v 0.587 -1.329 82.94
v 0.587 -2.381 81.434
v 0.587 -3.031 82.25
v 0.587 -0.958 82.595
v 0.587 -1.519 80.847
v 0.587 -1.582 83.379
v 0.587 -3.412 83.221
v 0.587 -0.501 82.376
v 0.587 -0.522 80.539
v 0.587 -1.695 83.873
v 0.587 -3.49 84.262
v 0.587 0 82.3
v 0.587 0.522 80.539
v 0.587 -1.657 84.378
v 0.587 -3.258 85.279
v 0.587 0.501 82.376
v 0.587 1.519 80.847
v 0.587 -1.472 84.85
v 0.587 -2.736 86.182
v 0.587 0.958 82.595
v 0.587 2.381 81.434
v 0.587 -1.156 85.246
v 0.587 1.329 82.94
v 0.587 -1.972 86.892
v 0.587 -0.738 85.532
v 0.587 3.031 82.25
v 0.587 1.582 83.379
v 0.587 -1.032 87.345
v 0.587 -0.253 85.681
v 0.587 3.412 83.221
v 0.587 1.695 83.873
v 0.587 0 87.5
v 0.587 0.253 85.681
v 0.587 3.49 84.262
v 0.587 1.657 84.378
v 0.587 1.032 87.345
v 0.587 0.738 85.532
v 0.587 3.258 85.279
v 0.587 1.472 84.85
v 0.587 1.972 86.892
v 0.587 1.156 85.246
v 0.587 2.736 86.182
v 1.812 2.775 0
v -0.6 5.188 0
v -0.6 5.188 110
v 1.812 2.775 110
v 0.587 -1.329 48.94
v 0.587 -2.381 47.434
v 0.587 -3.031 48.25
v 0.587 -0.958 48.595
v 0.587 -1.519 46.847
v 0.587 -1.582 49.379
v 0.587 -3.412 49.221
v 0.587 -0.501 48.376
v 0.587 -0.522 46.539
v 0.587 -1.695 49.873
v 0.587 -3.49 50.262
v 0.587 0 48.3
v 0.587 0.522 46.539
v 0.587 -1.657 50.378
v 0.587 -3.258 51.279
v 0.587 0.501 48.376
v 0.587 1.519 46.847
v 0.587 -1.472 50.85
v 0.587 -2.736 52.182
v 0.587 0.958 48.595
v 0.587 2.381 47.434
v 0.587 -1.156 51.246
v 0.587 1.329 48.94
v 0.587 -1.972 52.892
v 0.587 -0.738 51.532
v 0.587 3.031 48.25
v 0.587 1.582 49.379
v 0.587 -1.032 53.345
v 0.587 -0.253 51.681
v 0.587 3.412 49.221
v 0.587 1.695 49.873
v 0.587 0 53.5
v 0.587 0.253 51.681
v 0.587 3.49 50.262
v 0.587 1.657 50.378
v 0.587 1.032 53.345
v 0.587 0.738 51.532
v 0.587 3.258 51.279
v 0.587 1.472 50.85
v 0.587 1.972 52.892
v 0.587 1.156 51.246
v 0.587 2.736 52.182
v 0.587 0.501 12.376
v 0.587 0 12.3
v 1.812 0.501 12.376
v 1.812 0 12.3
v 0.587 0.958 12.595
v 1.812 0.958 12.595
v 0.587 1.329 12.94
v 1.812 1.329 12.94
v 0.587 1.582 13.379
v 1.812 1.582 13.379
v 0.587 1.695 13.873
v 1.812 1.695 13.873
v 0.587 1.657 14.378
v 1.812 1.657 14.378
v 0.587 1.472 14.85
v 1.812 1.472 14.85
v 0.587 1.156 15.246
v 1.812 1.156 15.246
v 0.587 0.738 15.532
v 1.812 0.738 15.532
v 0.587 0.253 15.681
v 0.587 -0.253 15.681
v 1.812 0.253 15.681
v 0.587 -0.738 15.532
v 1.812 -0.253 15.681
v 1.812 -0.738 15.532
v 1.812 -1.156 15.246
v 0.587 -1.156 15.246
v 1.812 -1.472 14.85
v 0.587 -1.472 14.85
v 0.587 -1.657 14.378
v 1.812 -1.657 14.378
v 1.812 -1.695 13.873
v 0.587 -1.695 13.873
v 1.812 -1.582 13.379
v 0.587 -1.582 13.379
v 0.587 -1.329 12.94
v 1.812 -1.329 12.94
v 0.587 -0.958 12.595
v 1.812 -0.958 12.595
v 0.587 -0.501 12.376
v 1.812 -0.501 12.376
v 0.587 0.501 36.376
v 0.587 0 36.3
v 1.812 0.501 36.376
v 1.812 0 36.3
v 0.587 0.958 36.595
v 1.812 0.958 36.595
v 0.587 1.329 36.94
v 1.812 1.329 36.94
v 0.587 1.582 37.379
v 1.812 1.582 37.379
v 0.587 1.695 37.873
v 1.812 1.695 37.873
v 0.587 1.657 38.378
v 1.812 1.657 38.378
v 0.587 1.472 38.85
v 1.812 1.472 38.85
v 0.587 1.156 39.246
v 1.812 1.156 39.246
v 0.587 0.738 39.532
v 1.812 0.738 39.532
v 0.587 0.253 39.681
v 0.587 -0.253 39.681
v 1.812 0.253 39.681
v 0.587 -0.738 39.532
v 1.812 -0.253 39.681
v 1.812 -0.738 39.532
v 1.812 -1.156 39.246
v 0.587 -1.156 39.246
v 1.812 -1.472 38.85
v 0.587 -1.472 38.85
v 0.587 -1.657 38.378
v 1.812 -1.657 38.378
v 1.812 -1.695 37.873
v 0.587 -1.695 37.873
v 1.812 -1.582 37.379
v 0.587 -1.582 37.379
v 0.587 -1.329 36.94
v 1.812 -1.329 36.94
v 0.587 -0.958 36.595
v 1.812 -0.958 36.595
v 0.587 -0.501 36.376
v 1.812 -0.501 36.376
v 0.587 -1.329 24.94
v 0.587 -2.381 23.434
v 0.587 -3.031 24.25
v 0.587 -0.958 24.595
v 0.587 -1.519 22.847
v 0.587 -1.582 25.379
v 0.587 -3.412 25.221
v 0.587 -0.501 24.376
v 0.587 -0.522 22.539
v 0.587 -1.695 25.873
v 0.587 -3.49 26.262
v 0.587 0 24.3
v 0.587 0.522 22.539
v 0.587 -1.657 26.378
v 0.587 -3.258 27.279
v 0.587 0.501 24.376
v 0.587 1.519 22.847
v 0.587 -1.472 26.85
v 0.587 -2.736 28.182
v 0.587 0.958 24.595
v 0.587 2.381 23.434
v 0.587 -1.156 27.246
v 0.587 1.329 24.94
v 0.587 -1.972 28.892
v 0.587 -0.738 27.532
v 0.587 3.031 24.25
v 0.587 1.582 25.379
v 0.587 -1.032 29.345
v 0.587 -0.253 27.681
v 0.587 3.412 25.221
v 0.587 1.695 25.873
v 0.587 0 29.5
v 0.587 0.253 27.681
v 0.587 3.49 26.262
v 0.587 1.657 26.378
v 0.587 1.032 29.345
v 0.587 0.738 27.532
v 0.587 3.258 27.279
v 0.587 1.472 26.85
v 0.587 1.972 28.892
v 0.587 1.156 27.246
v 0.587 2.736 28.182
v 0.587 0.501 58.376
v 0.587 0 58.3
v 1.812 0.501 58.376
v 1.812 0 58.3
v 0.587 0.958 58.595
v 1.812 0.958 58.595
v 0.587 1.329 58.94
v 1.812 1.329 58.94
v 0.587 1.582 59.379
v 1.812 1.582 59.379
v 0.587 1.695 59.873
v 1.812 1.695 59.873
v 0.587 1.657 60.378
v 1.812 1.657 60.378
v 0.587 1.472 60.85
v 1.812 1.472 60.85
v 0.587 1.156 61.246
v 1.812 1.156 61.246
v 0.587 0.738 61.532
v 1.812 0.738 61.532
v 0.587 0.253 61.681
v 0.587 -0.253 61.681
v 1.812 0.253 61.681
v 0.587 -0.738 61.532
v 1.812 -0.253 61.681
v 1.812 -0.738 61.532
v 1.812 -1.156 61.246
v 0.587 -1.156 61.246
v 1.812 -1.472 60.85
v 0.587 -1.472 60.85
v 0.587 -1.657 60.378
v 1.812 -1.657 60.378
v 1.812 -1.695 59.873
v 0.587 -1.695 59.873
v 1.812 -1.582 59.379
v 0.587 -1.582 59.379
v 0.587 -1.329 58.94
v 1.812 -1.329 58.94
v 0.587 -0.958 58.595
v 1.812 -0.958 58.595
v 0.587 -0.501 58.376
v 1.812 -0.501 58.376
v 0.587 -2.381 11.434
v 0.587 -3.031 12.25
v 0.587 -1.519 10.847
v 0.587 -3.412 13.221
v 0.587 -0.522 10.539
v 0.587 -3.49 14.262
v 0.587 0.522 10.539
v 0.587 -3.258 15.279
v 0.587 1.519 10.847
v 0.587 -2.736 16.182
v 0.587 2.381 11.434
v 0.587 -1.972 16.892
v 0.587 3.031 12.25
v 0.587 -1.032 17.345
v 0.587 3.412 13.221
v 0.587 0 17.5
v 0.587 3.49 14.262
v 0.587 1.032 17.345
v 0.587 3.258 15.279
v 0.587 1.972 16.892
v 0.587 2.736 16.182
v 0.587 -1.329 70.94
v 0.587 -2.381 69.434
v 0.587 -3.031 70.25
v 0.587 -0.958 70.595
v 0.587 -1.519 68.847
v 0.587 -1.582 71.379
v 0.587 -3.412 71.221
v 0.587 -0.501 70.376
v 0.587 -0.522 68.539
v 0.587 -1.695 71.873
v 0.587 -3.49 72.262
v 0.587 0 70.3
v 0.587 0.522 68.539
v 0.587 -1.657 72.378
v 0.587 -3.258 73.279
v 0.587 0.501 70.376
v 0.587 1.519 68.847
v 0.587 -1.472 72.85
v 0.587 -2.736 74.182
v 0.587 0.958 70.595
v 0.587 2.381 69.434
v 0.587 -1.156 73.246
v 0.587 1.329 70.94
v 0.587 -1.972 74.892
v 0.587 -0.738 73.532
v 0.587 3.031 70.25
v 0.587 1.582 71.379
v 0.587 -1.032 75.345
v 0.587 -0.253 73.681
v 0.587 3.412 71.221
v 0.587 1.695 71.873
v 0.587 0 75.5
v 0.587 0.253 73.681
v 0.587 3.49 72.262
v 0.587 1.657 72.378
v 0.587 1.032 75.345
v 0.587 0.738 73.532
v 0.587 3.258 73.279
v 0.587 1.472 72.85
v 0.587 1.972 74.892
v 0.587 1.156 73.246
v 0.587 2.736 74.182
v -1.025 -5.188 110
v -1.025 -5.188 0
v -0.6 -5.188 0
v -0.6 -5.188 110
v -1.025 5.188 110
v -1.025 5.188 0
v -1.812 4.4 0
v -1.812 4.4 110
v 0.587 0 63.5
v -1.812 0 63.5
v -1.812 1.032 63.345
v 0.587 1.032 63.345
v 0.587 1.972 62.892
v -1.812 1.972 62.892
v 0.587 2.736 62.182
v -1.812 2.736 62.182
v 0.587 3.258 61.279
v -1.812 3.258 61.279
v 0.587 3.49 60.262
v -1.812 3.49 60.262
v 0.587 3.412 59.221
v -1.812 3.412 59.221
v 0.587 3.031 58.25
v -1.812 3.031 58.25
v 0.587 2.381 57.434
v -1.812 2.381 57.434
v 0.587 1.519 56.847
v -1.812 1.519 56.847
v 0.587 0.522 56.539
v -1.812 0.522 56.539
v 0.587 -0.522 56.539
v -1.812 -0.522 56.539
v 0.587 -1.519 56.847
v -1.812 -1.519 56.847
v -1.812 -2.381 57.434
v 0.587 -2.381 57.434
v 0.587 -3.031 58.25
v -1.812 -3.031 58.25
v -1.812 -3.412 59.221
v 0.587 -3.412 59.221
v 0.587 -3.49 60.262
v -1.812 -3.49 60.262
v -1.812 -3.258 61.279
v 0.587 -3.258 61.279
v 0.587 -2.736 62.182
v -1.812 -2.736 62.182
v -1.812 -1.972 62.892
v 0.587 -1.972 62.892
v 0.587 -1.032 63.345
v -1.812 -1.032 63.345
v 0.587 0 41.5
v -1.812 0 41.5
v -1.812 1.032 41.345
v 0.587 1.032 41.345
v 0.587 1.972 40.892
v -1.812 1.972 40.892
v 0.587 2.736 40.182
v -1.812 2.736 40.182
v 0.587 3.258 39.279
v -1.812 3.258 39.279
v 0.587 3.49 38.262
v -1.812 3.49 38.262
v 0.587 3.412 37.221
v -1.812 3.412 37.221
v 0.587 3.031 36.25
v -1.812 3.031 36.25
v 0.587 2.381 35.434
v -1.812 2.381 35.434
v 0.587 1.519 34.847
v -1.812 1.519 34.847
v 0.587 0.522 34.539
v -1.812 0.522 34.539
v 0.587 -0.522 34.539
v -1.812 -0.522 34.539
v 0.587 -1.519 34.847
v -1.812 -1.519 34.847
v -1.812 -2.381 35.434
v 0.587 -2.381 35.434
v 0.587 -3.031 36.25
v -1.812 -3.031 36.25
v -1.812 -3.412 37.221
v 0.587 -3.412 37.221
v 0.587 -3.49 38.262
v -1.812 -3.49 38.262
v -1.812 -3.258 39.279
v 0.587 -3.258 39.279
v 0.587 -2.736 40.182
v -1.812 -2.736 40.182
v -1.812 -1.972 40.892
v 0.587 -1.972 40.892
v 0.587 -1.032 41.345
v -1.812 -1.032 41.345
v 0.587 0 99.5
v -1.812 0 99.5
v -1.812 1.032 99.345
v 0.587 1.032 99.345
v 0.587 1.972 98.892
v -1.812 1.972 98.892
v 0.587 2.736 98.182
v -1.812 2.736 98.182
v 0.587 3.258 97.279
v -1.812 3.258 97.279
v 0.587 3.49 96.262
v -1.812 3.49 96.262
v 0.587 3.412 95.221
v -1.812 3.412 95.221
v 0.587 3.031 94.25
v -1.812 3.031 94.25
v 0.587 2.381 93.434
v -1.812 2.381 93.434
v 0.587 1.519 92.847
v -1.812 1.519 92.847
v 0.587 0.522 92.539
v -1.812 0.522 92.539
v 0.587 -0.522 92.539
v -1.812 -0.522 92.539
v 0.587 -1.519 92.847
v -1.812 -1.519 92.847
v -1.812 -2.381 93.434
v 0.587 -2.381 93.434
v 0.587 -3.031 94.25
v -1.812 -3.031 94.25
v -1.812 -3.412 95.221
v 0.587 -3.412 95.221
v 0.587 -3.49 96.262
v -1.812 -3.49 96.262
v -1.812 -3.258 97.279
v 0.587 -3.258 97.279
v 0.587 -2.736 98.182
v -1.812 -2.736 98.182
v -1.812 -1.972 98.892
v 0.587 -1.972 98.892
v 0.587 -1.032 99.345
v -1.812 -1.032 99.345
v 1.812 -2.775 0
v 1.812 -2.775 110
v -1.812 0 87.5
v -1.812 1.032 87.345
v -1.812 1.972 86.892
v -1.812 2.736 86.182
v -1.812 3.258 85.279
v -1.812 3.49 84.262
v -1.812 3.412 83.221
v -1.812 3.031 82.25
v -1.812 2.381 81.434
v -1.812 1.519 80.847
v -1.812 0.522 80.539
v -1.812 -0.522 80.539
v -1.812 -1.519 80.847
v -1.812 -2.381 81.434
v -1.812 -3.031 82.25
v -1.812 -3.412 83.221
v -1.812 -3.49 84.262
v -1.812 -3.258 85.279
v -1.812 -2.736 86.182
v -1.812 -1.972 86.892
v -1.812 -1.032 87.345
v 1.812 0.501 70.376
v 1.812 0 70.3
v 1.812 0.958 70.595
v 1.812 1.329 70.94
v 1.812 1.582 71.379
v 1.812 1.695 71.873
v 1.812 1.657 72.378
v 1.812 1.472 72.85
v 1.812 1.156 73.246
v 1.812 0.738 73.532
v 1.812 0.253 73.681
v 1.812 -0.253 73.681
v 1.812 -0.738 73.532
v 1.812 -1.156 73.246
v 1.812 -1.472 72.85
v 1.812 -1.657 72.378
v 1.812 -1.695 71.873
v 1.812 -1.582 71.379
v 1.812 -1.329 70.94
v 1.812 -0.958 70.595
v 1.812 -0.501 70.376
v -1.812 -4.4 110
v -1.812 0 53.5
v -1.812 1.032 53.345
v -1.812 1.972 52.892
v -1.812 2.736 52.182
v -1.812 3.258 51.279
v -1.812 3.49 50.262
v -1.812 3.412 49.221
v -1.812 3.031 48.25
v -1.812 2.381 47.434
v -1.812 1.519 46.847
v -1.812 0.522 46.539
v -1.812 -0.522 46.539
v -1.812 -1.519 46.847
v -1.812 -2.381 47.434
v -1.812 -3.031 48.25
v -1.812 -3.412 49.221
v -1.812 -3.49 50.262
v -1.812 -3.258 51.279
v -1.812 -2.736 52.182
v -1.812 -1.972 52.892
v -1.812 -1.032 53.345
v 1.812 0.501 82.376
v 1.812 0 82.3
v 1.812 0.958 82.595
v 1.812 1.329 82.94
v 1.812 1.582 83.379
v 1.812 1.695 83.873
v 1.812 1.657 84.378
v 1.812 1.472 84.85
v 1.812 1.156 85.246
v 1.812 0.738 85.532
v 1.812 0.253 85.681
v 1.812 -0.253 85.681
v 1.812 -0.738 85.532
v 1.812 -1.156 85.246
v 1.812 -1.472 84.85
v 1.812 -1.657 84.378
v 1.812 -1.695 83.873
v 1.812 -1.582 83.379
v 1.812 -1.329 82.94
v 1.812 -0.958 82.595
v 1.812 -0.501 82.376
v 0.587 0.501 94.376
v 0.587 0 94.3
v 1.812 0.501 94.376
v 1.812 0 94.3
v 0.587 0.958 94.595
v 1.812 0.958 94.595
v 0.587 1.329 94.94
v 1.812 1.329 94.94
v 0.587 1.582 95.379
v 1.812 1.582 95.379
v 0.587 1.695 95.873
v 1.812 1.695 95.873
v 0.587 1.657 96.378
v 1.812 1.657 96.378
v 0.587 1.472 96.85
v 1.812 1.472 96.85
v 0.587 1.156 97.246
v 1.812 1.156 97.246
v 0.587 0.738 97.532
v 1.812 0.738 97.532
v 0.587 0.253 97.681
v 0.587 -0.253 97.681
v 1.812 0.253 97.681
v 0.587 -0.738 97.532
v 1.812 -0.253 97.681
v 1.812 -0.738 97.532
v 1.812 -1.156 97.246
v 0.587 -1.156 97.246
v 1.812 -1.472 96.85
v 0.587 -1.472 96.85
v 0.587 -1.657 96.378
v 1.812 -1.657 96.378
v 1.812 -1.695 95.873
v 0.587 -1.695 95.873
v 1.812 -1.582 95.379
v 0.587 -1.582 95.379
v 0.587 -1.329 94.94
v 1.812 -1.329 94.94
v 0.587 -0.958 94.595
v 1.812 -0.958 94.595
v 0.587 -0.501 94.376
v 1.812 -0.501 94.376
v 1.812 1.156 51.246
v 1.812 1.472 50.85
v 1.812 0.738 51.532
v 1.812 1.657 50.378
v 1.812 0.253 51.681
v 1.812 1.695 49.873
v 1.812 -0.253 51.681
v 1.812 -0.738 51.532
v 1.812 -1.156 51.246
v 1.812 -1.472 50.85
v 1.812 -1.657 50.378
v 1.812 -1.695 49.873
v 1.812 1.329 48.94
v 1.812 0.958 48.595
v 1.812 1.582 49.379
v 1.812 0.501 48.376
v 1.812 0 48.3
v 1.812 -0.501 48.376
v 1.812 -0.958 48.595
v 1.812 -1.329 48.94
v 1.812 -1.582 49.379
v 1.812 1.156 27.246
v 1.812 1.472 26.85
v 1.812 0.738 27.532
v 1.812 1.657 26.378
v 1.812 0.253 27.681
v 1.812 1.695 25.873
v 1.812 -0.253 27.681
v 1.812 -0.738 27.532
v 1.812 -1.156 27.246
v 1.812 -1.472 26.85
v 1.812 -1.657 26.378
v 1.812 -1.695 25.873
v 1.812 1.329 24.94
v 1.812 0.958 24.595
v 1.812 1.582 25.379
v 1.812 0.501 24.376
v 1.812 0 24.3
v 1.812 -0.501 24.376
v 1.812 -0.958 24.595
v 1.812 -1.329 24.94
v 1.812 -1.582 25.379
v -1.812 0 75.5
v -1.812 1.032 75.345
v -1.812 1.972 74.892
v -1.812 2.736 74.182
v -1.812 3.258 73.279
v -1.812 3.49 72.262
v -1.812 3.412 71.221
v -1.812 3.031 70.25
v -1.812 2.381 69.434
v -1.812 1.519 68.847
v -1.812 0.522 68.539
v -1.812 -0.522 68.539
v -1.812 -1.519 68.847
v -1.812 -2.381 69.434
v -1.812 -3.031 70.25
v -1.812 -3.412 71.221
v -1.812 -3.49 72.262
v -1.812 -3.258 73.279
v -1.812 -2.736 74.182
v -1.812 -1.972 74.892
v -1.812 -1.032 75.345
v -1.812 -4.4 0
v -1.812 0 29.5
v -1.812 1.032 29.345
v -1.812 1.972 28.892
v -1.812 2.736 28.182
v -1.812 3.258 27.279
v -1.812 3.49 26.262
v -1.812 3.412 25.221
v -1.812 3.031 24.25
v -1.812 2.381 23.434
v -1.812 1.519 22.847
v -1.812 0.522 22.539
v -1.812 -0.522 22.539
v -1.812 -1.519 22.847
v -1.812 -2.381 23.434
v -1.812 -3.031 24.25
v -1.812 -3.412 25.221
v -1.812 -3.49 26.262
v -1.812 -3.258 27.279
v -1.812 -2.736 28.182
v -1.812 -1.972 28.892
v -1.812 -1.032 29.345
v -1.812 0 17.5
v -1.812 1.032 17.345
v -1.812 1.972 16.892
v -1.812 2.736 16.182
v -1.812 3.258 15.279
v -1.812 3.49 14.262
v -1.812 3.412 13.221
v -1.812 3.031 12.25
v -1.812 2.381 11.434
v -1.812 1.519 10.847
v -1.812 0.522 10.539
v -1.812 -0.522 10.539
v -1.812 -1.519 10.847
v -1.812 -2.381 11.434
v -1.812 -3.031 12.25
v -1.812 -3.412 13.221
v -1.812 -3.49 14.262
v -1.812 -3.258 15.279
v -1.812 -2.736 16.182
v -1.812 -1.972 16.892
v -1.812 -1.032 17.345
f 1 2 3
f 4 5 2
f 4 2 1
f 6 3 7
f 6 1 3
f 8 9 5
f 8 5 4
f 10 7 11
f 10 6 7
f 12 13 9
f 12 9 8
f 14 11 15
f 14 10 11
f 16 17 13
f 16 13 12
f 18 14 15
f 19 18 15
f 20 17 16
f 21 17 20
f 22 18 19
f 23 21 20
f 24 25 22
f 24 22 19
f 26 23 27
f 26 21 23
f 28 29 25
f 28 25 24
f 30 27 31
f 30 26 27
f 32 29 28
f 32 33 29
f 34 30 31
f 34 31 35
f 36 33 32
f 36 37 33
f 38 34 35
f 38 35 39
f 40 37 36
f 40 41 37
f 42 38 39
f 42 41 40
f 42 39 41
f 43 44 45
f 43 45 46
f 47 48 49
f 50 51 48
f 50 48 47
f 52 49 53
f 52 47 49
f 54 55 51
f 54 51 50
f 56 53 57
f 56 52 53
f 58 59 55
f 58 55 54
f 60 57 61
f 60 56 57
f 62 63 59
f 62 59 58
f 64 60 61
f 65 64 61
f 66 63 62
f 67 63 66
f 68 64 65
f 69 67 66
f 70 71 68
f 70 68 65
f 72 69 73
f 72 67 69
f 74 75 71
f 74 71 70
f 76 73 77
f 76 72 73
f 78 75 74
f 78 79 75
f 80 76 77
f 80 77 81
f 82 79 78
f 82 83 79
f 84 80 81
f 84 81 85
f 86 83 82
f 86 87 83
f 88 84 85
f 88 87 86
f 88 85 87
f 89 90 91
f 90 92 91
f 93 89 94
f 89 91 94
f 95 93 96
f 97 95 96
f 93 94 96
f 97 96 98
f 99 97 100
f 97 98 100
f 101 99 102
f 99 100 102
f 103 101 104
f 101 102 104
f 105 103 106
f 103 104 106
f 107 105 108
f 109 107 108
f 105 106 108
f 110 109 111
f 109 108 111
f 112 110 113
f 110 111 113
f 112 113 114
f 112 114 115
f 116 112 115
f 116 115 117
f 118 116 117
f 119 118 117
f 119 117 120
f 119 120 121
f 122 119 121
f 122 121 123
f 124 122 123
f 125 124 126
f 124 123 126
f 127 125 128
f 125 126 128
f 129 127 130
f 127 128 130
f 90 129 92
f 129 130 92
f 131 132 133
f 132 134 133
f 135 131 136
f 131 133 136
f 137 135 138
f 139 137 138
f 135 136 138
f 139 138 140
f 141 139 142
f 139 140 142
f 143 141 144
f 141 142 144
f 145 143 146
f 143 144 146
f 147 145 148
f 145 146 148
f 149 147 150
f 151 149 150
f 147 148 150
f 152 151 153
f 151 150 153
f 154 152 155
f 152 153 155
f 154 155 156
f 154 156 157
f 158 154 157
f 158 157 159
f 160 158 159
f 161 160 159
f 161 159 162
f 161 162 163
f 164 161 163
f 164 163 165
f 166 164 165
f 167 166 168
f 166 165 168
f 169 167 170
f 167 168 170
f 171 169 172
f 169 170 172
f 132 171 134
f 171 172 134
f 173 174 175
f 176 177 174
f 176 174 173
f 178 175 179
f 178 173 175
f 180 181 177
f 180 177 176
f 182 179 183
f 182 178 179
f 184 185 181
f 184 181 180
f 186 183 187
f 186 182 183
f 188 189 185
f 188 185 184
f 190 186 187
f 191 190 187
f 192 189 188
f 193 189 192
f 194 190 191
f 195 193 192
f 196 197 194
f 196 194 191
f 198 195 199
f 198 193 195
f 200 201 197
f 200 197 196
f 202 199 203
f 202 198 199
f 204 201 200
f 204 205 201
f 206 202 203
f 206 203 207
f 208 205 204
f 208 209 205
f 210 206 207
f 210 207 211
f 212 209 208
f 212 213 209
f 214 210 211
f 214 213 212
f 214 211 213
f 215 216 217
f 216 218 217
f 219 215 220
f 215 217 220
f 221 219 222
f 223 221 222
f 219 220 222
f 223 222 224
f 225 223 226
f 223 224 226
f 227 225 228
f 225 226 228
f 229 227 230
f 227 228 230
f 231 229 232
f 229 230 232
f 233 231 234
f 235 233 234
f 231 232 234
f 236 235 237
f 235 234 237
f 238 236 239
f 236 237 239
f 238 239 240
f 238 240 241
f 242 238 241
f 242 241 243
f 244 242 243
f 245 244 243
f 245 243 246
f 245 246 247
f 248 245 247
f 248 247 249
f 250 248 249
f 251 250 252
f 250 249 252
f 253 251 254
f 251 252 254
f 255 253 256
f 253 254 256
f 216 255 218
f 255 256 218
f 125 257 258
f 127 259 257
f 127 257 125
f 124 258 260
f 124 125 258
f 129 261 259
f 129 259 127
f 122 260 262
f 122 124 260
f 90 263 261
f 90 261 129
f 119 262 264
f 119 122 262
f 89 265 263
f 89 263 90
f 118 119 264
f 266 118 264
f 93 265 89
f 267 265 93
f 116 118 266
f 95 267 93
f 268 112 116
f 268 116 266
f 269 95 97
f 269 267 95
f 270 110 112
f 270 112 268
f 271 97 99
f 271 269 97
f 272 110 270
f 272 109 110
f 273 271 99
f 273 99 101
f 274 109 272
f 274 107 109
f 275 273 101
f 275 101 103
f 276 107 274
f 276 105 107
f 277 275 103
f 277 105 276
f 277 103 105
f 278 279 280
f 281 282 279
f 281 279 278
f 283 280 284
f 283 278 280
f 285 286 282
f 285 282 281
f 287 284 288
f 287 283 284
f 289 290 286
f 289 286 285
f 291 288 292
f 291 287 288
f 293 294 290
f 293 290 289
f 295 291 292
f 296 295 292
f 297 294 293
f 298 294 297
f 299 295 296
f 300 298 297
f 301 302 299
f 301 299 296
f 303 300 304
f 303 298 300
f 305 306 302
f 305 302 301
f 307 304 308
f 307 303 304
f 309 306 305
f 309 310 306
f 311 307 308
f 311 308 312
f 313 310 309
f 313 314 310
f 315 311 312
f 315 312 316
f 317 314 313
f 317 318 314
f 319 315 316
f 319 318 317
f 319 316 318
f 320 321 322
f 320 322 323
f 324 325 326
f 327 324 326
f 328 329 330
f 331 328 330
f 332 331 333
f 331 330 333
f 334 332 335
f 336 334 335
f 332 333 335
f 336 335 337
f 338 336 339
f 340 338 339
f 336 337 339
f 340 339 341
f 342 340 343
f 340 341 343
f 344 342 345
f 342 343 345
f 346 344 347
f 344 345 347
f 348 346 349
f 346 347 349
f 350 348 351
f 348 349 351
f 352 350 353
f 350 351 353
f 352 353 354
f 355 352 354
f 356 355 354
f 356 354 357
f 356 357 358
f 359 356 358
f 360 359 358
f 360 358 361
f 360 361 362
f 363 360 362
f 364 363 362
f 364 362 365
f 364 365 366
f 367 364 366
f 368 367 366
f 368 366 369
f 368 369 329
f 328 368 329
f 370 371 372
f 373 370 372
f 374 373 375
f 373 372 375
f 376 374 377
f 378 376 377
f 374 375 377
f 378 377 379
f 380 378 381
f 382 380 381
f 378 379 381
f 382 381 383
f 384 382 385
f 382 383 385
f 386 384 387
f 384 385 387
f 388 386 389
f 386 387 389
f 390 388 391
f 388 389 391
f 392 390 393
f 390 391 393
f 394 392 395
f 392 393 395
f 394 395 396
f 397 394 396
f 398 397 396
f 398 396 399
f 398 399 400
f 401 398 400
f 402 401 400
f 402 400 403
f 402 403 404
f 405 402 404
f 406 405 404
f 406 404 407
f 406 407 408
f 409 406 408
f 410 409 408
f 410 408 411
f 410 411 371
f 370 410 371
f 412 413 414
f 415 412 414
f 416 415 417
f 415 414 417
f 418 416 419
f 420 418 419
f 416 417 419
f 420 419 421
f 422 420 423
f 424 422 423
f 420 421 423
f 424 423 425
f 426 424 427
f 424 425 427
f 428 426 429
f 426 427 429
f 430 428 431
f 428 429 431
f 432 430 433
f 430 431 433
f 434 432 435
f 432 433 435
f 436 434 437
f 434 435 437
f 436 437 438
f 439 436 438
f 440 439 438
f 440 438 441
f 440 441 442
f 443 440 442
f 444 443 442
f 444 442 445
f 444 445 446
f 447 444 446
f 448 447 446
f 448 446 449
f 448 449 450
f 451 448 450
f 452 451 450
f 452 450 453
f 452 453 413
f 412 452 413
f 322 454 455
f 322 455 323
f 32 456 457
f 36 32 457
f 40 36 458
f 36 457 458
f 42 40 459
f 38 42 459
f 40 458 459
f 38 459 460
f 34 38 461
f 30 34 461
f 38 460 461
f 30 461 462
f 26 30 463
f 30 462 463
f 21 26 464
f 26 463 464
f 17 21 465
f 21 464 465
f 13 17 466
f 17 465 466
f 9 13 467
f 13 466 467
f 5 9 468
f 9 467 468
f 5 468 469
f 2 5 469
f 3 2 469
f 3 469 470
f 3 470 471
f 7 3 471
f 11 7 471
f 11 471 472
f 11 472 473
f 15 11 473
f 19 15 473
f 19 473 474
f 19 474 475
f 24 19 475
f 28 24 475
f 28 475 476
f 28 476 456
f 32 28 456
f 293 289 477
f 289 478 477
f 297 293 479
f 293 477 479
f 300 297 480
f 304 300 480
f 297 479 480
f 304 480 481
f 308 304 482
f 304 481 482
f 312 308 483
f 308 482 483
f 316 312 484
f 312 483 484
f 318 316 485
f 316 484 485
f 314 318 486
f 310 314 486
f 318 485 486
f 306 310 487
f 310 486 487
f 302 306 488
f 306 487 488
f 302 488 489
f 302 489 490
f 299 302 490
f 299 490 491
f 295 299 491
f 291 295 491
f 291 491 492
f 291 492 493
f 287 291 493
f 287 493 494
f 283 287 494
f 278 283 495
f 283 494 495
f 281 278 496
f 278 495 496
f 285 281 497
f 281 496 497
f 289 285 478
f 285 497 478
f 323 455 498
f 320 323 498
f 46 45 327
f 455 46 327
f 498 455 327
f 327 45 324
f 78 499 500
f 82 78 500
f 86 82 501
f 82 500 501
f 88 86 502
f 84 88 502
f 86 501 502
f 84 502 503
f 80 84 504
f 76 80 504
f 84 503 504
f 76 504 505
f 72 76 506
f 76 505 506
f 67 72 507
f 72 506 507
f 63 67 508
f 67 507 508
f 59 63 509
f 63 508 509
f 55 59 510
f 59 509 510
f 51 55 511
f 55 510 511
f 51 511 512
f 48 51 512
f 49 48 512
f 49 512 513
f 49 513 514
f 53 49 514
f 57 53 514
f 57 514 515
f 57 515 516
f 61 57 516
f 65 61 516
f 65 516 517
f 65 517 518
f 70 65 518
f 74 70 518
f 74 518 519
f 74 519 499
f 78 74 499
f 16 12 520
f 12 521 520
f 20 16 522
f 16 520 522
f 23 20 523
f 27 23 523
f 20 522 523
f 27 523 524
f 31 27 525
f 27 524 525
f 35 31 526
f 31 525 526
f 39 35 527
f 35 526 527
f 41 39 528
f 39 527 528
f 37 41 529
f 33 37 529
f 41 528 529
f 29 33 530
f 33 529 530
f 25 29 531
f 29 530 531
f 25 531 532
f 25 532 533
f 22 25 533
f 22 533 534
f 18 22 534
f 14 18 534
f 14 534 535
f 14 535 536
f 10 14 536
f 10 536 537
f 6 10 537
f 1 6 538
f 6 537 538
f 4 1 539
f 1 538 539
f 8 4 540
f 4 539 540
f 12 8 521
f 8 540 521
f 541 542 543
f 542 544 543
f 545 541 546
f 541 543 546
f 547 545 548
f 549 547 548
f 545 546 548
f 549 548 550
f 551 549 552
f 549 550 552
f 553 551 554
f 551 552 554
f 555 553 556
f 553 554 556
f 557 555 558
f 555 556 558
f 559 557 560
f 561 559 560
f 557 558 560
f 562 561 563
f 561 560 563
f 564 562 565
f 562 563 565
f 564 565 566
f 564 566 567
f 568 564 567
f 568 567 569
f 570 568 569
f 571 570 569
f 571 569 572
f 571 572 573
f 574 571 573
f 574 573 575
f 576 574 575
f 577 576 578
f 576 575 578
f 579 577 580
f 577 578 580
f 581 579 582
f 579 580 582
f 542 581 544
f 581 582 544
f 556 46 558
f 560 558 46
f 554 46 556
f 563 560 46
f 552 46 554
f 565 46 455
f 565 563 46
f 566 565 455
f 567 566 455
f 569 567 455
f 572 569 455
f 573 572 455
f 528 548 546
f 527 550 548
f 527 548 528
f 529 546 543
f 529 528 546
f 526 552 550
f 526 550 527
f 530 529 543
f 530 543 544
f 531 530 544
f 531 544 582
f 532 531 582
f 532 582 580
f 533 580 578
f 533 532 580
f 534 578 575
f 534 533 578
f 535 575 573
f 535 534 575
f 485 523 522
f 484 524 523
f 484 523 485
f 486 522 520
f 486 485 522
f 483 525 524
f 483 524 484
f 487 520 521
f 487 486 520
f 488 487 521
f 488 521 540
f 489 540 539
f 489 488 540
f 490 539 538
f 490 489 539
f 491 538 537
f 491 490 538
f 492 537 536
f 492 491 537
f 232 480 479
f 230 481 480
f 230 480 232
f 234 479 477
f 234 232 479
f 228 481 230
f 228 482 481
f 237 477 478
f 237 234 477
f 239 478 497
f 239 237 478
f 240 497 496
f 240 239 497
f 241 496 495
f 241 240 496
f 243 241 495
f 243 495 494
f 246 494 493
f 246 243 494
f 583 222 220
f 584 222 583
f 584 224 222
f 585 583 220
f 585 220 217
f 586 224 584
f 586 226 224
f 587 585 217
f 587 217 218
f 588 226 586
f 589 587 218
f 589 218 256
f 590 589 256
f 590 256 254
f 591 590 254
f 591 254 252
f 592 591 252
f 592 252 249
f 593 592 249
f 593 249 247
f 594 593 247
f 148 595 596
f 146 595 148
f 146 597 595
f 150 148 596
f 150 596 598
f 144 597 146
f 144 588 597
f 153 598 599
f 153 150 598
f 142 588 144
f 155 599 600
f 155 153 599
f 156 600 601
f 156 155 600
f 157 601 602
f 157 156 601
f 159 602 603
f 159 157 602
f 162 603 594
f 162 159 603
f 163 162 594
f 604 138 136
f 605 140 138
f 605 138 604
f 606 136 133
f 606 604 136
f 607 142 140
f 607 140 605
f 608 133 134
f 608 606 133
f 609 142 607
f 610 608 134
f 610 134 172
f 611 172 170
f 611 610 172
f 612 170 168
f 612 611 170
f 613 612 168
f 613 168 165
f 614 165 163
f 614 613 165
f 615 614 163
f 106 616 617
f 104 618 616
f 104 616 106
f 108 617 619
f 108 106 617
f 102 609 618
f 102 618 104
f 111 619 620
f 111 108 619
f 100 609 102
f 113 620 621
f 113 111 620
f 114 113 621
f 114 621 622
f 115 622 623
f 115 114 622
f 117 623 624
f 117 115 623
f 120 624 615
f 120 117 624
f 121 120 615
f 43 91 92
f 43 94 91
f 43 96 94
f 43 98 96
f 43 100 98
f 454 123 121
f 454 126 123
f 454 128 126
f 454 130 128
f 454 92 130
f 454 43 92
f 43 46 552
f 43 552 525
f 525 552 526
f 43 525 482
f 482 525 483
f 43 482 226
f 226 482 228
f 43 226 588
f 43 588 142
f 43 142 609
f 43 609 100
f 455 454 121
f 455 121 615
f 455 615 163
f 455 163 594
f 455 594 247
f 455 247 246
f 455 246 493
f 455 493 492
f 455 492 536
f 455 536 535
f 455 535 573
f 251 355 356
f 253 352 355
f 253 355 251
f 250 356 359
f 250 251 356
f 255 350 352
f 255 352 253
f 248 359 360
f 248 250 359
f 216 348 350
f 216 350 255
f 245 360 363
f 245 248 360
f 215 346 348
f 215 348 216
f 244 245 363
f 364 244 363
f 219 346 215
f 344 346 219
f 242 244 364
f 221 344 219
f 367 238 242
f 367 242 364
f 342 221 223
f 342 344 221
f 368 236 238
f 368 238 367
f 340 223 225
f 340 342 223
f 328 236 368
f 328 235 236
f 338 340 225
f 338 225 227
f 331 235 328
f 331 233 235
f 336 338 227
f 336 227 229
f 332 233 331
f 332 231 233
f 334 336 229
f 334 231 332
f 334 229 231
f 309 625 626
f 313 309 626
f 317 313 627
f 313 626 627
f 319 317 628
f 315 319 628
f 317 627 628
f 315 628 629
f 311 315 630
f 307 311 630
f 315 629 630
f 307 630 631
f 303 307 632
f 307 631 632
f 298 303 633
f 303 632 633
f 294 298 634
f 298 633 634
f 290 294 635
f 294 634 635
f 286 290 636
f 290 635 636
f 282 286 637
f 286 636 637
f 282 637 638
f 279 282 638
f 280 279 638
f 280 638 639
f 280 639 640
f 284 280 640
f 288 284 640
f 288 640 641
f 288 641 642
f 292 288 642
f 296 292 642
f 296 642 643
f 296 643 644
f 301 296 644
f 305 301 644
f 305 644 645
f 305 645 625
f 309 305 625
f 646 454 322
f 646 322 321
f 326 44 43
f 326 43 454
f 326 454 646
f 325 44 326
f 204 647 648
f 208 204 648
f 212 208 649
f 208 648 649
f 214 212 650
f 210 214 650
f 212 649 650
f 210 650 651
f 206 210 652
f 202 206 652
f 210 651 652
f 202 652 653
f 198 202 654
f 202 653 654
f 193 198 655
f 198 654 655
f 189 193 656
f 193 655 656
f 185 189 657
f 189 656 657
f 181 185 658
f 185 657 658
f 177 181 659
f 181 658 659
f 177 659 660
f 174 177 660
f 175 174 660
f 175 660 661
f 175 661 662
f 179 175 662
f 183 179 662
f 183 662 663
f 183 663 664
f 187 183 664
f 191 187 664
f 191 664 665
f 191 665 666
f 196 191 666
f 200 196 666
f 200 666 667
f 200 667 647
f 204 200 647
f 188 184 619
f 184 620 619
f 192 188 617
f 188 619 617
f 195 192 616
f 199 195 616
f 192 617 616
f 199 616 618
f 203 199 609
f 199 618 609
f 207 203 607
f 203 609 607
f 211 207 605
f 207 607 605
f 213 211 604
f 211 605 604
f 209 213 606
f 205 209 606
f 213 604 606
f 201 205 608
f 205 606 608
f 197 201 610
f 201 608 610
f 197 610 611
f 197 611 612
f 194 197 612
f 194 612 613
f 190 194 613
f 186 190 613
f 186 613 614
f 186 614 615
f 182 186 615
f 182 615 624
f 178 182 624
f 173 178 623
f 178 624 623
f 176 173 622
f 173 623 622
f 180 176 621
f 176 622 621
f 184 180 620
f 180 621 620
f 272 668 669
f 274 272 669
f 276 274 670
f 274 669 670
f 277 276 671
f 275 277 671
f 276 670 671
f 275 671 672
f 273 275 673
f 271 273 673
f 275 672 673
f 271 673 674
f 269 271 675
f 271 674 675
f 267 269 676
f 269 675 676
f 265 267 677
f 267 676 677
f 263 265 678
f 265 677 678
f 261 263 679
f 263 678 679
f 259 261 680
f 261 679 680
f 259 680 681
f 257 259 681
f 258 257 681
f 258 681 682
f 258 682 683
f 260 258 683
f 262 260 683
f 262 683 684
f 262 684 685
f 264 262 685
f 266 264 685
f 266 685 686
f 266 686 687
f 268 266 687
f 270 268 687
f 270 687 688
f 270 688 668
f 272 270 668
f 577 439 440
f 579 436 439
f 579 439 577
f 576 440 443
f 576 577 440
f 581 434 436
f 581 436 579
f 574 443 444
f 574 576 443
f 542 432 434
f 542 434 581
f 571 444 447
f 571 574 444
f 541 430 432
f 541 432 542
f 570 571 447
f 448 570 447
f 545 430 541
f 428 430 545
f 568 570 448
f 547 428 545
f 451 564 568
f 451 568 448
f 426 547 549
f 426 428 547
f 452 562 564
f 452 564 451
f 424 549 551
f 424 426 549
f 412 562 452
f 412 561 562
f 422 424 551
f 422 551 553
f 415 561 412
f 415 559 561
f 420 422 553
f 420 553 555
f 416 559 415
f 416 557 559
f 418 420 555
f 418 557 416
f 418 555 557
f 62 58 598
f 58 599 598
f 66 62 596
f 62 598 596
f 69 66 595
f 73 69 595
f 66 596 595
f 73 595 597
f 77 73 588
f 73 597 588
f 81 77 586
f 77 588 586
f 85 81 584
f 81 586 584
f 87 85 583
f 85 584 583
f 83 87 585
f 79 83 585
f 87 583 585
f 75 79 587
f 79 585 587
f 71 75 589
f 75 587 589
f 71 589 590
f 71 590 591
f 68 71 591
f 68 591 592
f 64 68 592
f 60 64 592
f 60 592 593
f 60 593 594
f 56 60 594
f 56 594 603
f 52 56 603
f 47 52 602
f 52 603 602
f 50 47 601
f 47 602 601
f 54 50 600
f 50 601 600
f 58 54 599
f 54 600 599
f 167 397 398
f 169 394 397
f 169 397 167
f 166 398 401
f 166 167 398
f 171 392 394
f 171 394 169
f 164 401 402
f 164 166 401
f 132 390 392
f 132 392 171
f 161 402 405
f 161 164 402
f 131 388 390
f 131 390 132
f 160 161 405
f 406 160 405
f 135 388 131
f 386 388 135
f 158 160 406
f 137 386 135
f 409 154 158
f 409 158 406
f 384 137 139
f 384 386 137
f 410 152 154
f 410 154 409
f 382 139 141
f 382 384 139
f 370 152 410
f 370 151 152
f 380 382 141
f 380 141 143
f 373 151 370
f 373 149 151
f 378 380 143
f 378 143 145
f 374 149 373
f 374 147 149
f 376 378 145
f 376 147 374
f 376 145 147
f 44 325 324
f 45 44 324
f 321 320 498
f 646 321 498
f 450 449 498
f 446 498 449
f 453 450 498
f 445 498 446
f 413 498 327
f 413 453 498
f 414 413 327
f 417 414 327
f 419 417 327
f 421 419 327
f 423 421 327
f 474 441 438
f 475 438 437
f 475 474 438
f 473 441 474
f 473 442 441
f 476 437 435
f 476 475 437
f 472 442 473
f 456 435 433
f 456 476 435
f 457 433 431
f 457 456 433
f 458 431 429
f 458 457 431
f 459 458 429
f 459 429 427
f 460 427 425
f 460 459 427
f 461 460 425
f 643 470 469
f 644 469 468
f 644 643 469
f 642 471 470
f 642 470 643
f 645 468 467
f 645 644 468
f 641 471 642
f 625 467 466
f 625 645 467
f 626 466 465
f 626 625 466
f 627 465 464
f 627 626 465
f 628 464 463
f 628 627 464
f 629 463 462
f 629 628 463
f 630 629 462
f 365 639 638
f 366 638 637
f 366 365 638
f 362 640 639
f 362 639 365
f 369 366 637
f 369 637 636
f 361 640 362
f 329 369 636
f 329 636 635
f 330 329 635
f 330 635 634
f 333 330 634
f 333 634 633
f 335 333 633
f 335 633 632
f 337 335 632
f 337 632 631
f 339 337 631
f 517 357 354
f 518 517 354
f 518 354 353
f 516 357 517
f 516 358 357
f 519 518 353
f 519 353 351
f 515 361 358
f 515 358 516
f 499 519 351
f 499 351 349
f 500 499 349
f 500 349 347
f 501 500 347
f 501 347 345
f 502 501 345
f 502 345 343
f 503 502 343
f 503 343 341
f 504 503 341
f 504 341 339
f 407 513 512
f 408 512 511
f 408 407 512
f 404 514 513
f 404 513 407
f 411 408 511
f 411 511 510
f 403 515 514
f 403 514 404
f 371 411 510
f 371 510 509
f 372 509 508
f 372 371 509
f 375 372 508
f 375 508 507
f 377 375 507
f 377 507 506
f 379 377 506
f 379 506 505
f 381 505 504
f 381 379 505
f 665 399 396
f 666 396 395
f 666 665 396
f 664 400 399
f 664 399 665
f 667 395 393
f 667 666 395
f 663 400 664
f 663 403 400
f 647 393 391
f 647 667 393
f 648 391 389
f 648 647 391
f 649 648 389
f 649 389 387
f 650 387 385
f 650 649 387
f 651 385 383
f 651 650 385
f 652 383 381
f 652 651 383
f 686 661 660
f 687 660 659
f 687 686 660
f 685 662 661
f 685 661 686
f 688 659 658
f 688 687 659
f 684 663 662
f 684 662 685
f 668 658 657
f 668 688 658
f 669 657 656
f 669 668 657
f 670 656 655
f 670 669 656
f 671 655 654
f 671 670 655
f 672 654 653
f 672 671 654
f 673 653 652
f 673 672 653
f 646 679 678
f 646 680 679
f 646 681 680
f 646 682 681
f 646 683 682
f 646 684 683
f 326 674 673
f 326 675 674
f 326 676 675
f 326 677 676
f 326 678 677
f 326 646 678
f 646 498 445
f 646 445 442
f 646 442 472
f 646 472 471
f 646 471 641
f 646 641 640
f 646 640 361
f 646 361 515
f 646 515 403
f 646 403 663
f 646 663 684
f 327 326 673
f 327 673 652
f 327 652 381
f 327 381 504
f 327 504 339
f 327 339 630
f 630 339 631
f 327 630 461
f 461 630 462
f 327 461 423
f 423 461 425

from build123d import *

# Parameters (mm, degrees)
BOSS_EXTRUDE2_DEPTH                                = 110
CHAMBRAGE_POUR_VIS_T_TE_RONDE_BOMB_E_M_D           = 3.4
CHAMBRAGE_POUR_VIS_T_TE_RONDE_BOMB_E_M_DEPTH       = 7
CHAMBRAGE_POUR_VIS_T_TE_RONDE_BOMB_E_M_CBORE_D     = 7
CHAMBRAGE_POUR_VIS_T_TE_RONDE_BOMB_E_M_CBORE_DEPTH = 2.4
CUT_EXTRUDE1_DEPTH                                 = 111.147379253
CHAMFER1_SIZE                                      = 0.3


with BuildPart() as part:
    # Sketch1 → Boss-Extrude2 (new body)
    with BuildSketch(Plane.XY):
        Polygon((-1.8125, 5.4), (-0.8125, 5.4), (1.8125, 2.775), (1.8125, -2.775), (-0.8125, -5.4), (-1.8125, -5.4), align=None)
    extrude(amount=BOSS_EXTRUDE2_DEPTH)

    # Chambrage pour vis _ t_te ronde bomb_e M
    with Locations(Plane.ZY.offset(1.8125)):
        with Locations((60, 0), (50, 0), (38, 0), (26, 0), (14, 0), (72, 0), (84, 0), (96, 0)):
            CounterBoreHole(CHAMBRAGE_POUR_VIS_T_TE_RONDE_BOMB_E_M_D / 2, CHAMBRAGE_POUR_VIS_T_TE_RONDE_BOMB_E_M_CBORE_D / 2, CHAMBRAGE_POUR_VIS_T_TE_RONDE_BOMB_E_M_CBORE_DEPTH, depth=CHAMBRAGE_POUR_VIS_T_TE_RONDE_BOMB_E_M_DEPTH)

    # Sketch2 → Cut-Extrude1 (cut, through all)
    with BuildSketch(Plane.XY.offset(110)):
        Polygon((-0.8125, 5.4), (-1.8125, 4.4), (-1.8125, 5.4), align=None)
        Polygon((-0.8125, -5.4), (-1.8125, -4.4), (-1.8125, -5.4), align=None)
    extrude(amount=-CUT_EXTRUDE1_DEPTH, mode=Mode.SUBTRACT)

    # Chamfer1
    chamfer1_edges = [part.edges().sort_by_distance(p)[0] for p in [
        (-0.8125, 5.4, 55),
        (-0.8125, -5.4, 55),
    ]]
    chamfer(chamfer1_edges, length=CHAMFER1_SIZE)


solid = part.part
